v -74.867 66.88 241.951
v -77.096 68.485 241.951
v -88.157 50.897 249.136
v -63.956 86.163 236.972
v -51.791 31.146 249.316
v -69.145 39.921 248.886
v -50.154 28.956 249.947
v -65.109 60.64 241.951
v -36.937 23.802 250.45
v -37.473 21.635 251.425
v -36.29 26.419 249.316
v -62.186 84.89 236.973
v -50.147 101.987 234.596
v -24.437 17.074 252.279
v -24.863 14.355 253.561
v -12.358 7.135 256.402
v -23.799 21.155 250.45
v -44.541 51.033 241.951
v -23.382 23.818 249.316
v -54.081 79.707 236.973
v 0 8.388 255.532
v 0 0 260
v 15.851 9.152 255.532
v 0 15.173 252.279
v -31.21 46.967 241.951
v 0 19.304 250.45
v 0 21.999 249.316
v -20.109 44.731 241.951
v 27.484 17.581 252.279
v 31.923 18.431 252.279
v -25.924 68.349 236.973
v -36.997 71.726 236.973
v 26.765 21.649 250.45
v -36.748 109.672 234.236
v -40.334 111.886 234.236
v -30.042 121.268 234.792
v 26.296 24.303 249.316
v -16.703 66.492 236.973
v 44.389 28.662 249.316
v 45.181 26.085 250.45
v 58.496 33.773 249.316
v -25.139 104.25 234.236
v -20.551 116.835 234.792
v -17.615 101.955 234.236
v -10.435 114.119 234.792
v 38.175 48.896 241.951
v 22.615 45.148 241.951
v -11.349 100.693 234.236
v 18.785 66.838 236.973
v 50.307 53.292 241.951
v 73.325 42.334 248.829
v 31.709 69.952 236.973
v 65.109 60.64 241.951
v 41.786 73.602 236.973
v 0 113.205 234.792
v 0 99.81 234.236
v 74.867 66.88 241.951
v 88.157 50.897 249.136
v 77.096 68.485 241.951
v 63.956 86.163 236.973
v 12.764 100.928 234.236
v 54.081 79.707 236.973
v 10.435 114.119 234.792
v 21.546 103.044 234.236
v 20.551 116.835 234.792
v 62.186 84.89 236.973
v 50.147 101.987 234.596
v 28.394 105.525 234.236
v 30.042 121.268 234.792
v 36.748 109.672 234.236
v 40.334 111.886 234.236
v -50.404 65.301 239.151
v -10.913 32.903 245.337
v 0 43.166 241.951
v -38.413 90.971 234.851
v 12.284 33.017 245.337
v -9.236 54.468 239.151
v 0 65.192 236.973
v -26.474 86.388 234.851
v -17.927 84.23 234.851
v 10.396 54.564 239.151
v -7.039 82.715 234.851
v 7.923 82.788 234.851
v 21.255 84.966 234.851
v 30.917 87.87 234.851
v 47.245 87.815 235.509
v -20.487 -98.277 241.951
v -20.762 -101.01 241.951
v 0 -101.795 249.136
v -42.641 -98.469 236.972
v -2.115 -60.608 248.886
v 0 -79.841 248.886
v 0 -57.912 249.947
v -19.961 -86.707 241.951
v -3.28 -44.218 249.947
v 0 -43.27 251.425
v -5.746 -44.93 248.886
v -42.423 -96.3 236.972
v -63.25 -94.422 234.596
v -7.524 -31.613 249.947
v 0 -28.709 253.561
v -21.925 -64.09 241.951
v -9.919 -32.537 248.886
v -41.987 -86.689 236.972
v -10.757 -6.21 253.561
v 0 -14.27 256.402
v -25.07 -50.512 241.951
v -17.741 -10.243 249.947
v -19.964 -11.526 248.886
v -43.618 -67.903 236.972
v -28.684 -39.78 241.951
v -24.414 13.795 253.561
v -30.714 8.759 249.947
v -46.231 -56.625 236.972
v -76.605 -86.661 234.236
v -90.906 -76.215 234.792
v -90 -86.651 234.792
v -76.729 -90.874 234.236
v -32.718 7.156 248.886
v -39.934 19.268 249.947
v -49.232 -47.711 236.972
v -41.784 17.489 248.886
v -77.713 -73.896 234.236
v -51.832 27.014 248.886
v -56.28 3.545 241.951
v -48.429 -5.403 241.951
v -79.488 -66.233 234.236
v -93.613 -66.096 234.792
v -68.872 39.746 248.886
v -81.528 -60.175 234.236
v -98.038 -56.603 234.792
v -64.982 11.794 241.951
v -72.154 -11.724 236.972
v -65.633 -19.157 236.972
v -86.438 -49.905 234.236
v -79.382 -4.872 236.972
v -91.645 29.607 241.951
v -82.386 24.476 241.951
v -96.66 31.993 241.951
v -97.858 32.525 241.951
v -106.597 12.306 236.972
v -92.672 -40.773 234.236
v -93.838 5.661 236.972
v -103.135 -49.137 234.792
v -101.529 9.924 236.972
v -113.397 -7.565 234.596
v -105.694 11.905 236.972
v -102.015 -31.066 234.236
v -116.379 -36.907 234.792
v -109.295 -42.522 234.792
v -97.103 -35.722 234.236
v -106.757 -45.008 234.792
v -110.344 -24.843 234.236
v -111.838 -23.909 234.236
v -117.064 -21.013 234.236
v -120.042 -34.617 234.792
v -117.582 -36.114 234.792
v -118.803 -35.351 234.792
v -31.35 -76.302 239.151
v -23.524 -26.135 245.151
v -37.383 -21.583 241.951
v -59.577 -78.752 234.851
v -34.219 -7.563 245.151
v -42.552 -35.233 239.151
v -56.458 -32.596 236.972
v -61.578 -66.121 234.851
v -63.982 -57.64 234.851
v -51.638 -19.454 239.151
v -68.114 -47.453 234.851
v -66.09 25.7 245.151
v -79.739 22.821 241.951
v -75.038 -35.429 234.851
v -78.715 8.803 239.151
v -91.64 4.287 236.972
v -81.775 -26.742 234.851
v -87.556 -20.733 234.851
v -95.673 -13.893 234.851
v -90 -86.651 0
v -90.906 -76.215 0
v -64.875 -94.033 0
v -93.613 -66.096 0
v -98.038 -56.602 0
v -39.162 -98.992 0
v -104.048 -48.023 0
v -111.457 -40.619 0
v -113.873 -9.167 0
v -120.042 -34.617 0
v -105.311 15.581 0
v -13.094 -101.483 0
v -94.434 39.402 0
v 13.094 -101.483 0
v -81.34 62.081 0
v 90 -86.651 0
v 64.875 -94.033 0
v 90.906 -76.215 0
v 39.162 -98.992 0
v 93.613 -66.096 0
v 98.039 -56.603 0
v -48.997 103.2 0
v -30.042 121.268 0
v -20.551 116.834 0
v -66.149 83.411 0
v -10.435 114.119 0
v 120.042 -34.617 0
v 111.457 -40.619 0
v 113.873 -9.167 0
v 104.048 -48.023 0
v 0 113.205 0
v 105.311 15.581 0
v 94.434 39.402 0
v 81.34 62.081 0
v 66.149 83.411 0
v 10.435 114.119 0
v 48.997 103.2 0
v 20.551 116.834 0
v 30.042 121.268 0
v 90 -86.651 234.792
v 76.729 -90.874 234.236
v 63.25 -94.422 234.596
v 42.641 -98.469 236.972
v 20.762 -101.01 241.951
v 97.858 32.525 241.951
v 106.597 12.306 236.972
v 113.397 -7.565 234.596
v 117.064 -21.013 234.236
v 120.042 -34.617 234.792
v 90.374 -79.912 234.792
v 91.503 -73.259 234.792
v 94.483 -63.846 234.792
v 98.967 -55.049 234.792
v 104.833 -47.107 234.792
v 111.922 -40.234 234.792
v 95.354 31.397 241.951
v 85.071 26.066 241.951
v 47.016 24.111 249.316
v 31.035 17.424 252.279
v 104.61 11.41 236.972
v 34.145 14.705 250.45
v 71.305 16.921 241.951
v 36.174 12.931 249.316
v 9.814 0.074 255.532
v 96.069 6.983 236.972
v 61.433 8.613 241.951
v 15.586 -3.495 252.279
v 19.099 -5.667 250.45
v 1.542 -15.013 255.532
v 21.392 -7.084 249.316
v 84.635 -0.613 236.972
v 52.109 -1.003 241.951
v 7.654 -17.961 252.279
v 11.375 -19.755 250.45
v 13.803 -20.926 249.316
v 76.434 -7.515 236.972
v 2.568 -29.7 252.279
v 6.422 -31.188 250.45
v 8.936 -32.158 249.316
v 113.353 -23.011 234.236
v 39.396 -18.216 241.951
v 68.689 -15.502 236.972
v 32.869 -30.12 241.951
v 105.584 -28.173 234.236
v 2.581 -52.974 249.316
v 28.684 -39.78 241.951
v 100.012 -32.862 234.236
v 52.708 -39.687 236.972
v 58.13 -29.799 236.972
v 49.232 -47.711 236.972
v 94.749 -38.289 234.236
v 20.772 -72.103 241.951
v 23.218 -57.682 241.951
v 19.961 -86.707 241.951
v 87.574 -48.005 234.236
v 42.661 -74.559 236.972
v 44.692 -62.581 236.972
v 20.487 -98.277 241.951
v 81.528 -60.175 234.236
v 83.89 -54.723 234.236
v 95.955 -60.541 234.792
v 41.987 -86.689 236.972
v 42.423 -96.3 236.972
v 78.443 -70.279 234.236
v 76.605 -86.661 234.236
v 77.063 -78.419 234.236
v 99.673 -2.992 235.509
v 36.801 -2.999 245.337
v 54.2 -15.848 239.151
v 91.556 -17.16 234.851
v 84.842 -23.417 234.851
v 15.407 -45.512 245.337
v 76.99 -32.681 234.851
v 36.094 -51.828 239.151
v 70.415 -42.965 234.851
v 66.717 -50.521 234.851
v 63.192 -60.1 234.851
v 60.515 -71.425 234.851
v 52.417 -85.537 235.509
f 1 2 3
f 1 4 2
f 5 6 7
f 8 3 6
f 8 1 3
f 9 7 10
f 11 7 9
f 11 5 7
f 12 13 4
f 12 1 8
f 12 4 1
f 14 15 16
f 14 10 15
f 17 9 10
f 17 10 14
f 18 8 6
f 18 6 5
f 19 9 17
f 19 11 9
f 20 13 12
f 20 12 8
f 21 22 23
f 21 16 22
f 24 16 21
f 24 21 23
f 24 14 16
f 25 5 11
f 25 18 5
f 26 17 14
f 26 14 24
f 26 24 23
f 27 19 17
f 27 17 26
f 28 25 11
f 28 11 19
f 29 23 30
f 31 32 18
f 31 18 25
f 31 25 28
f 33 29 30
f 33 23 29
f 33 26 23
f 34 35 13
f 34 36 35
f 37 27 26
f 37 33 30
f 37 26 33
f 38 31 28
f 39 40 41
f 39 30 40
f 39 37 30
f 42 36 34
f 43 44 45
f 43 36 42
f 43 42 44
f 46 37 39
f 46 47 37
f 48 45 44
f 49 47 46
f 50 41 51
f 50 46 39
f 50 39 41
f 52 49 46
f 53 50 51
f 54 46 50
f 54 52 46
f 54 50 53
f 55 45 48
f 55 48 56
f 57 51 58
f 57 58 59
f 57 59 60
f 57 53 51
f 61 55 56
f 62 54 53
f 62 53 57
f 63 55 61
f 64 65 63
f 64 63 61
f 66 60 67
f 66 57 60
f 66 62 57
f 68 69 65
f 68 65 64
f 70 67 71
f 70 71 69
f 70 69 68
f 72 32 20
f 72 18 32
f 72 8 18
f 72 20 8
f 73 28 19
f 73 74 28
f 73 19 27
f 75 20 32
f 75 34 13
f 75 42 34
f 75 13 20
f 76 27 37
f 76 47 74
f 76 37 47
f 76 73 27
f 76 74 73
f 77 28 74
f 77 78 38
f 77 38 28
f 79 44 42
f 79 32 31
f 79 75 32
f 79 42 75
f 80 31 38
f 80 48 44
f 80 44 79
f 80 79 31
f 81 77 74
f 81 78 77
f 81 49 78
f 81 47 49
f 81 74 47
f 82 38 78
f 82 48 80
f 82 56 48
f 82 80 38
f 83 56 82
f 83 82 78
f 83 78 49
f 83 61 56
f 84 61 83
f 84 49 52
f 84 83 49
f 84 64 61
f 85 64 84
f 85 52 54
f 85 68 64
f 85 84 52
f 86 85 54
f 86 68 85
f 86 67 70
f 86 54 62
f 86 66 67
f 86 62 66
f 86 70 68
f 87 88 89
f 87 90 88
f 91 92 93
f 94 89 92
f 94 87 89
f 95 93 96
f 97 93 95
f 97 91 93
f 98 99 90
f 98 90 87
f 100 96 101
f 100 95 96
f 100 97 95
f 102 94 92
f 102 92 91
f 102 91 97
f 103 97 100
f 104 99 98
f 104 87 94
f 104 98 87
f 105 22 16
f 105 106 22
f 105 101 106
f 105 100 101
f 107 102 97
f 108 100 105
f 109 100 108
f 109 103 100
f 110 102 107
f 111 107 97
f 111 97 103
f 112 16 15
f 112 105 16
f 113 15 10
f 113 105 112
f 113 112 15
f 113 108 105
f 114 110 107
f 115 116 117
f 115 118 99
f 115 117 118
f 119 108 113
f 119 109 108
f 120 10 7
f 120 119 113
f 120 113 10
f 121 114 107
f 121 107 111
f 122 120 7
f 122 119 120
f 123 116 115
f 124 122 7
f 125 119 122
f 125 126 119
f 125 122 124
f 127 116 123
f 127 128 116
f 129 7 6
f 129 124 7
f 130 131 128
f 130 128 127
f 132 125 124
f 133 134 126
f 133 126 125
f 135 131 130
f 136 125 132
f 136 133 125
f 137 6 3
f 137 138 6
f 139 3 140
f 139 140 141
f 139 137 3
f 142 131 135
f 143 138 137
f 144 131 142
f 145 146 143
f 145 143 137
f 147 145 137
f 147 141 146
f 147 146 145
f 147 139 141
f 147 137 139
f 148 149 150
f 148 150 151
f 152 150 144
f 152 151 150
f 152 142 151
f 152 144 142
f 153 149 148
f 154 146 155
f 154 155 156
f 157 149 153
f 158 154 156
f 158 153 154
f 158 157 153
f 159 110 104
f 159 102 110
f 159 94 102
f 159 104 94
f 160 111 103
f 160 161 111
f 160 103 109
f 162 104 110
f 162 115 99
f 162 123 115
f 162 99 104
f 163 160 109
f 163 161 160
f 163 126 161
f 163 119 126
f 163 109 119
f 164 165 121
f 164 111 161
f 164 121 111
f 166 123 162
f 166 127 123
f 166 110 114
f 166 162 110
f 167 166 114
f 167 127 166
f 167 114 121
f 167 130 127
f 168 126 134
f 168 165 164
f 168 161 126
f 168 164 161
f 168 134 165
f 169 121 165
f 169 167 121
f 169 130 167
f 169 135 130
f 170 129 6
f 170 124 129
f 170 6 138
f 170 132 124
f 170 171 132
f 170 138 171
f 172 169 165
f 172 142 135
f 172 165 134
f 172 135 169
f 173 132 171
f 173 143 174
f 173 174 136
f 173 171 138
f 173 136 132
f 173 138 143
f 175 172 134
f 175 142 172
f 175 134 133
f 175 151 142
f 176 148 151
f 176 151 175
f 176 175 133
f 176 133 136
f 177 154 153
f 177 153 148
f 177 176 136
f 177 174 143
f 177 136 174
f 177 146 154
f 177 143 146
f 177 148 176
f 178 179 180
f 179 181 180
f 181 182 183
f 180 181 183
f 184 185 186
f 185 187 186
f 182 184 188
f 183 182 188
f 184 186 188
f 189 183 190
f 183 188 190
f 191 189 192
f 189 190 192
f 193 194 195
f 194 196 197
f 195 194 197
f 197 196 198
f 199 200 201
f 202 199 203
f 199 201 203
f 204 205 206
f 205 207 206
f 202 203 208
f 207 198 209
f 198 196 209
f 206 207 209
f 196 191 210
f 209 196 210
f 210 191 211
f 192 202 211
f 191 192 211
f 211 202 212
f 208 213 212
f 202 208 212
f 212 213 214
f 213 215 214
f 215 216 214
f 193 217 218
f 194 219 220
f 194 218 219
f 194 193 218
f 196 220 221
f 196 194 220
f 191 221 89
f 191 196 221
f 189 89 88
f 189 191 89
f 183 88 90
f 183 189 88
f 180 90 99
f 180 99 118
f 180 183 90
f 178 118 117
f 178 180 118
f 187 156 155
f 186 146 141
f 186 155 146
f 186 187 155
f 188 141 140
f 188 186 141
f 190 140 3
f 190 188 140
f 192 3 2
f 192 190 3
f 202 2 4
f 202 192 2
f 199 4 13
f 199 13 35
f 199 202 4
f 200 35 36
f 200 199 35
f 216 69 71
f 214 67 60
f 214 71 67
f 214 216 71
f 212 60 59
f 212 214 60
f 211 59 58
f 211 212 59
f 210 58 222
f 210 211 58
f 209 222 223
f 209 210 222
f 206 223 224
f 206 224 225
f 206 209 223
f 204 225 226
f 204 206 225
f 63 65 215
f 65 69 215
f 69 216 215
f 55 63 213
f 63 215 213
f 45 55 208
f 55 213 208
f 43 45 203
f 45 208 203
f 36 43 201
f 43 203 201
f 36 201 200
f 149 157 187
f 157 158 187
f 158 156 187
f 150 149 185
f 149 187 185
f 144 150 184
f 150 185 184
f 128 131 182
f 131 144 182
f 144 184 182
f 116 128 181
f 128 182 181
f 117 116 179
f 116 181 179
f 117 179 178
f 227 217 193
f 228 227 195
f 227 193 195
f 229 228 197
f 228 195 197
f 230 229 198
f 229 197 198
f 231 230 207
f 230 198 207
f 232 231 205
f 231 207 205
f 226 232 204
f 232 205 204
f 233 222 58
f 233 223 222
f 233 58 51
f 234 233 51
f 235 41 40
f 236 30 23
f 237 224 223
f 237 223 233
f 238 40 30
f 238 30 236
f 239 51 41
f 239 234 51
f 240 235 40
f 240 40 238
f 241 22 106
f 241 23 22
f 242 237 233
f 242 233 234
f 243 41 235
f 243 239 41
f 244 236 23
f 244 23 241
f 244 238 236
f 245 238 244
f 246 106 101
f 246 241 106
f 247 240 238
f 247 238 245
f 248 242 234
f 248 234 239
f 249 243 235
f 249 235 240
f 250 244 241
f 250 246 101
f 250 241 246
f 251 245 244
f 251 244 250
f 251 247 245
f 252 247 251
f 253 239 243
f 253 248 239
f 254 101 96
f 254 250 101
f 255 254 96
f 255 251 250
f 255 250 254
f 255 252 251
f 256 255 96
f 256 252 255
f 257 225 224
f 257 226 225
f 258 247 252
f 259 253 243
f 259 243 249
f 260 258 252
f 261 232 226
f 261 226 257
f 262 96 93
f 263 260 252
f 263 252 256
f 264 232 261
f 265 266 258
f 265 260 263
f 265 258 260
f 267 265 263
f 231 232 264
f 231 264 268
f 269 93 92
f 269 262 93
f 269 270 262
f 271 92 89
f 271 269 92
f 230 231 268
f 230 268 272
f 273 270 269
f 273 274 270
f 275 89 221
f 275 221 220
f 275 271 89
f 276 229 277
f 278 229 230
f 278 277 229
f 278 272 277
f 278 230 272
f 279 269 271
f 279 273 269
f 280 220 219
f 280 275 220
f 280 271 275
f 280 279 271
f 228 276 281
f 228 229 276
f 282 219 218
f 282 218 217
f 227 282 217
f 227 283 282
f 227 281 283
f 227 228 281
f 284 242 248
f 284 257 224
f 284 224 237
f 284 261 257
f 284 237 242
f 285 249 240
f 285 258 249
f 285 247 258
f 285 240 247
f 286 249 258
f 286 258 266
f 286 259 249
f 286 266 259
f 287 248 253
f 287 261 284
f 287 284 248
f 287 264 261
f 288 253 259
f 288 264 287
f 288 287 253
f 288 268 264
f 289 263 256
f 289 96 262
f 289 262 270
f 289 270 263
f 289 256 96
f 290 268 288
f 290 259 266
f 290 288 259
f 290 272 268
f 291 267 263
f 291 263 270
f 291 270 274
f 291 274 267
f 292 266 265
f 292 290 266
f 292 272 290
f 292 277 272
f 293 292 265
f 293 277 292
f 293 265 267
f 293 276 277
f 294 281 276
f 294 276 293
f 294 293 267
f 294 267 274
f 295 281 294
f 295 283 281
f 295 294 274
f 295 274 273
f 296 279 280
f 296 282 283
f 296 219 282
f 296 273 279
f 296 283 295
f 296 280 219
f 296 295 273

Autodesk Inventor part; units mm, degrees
ref_plane "YZ Plane" through (0, 0, 0) normal (1, 0, 0) x (0, 1, 0)
ref_plane "XZ Plane" through (0, 0, 0) normal (0, 1, 0) x (-1, 0, 0)
ref_plane "XY Plane" through (0, 0, 0) normal (0, 0, 1) x (1, 0, 0)
sketch "Sketch1" plane through (0, 0, 0) normal (0, 0, 1) x (1, 0, 0)
  line L0 (-150, -86.6025) -> (0, 173.2051) construction
  line L1 (0, 173.2051) -> (150, -86.6025) construction
  line L2 (150, -86.6025) -> (-150, -86.6025) construction
  arc A0 (120.0417, -34.617) -> (30.0416, 121.2676) centre (-150, -86.6025) ccw
  arc A1 (-90, -86.6506) -> (-120.0417, -34.617) centre (-150, -86.6025) ccw
  arc A2 (120.0417, -34.617) -> (90, -86.6506) centre (150, -86.6025) ccw
  arc A3 (-30.0416, 121.2676) -> (30.0416, 121.2676) centre (0, 173.2051) ccw
  arc A4 (-30.0416, 121.2676) -> (-120.0417, -34.617) centre (150, -86.6025) ccw
  arc A5 (-90, -86.6506) -> (90, -86.6506) centre (0, 173.2051) ccw
  point P0 (0, 0)
  point P1 (0, 0)
  dimension "d0" = 300
  dimension "d2" = 120
  dimension "d3" = 275
extrude "Extrusion1" add sketch "Sketch1" along normal blind 260
sketch "Sketch2" plane through (0, 0, 0) normal (1, 0, 0) x (0, 1, 0)
  line L0 (113.2051, 260) -> (113.2051, 0) projected
  line L1 (113.2051, 0) -> (-101.7949, 0) projected
  line L2 (-101.7949, 0) -> (-101.7949, 260) projected
  line L3 (-101.7949, 260) -> (113.2051, 260) projected
  line L4 (0, 0) -> (0, 260)
  arc A0 (173.2051, 619.634) -> (173.2051, 248.8241) centre (98.2051, 434.2291) ccw
  line L5 (113.2051, 260) -> (121.2676, 260) projected
  line L6 (173.2051, -124.8458) -> (173.2051, 749.0749) projected
  line L7 (173.2051, 619.634) -> (173.2051, 248.8241)
  dimension "d6" = 75
  dimension "d7" = 400
revolve "Revolution1" cut sketch "Sketch2" angle 360 about axis through (0, 173.2051, 0) along (0, 0, 1) contours L3 A0 L6 L0 | L0 A0 L3
pattern_circular "Circular Pattern1" count 3 over 360 about axis through (0, 0, -10) along (0, 0, 1) of "Revolution1"
properties part number "VOLUME"
